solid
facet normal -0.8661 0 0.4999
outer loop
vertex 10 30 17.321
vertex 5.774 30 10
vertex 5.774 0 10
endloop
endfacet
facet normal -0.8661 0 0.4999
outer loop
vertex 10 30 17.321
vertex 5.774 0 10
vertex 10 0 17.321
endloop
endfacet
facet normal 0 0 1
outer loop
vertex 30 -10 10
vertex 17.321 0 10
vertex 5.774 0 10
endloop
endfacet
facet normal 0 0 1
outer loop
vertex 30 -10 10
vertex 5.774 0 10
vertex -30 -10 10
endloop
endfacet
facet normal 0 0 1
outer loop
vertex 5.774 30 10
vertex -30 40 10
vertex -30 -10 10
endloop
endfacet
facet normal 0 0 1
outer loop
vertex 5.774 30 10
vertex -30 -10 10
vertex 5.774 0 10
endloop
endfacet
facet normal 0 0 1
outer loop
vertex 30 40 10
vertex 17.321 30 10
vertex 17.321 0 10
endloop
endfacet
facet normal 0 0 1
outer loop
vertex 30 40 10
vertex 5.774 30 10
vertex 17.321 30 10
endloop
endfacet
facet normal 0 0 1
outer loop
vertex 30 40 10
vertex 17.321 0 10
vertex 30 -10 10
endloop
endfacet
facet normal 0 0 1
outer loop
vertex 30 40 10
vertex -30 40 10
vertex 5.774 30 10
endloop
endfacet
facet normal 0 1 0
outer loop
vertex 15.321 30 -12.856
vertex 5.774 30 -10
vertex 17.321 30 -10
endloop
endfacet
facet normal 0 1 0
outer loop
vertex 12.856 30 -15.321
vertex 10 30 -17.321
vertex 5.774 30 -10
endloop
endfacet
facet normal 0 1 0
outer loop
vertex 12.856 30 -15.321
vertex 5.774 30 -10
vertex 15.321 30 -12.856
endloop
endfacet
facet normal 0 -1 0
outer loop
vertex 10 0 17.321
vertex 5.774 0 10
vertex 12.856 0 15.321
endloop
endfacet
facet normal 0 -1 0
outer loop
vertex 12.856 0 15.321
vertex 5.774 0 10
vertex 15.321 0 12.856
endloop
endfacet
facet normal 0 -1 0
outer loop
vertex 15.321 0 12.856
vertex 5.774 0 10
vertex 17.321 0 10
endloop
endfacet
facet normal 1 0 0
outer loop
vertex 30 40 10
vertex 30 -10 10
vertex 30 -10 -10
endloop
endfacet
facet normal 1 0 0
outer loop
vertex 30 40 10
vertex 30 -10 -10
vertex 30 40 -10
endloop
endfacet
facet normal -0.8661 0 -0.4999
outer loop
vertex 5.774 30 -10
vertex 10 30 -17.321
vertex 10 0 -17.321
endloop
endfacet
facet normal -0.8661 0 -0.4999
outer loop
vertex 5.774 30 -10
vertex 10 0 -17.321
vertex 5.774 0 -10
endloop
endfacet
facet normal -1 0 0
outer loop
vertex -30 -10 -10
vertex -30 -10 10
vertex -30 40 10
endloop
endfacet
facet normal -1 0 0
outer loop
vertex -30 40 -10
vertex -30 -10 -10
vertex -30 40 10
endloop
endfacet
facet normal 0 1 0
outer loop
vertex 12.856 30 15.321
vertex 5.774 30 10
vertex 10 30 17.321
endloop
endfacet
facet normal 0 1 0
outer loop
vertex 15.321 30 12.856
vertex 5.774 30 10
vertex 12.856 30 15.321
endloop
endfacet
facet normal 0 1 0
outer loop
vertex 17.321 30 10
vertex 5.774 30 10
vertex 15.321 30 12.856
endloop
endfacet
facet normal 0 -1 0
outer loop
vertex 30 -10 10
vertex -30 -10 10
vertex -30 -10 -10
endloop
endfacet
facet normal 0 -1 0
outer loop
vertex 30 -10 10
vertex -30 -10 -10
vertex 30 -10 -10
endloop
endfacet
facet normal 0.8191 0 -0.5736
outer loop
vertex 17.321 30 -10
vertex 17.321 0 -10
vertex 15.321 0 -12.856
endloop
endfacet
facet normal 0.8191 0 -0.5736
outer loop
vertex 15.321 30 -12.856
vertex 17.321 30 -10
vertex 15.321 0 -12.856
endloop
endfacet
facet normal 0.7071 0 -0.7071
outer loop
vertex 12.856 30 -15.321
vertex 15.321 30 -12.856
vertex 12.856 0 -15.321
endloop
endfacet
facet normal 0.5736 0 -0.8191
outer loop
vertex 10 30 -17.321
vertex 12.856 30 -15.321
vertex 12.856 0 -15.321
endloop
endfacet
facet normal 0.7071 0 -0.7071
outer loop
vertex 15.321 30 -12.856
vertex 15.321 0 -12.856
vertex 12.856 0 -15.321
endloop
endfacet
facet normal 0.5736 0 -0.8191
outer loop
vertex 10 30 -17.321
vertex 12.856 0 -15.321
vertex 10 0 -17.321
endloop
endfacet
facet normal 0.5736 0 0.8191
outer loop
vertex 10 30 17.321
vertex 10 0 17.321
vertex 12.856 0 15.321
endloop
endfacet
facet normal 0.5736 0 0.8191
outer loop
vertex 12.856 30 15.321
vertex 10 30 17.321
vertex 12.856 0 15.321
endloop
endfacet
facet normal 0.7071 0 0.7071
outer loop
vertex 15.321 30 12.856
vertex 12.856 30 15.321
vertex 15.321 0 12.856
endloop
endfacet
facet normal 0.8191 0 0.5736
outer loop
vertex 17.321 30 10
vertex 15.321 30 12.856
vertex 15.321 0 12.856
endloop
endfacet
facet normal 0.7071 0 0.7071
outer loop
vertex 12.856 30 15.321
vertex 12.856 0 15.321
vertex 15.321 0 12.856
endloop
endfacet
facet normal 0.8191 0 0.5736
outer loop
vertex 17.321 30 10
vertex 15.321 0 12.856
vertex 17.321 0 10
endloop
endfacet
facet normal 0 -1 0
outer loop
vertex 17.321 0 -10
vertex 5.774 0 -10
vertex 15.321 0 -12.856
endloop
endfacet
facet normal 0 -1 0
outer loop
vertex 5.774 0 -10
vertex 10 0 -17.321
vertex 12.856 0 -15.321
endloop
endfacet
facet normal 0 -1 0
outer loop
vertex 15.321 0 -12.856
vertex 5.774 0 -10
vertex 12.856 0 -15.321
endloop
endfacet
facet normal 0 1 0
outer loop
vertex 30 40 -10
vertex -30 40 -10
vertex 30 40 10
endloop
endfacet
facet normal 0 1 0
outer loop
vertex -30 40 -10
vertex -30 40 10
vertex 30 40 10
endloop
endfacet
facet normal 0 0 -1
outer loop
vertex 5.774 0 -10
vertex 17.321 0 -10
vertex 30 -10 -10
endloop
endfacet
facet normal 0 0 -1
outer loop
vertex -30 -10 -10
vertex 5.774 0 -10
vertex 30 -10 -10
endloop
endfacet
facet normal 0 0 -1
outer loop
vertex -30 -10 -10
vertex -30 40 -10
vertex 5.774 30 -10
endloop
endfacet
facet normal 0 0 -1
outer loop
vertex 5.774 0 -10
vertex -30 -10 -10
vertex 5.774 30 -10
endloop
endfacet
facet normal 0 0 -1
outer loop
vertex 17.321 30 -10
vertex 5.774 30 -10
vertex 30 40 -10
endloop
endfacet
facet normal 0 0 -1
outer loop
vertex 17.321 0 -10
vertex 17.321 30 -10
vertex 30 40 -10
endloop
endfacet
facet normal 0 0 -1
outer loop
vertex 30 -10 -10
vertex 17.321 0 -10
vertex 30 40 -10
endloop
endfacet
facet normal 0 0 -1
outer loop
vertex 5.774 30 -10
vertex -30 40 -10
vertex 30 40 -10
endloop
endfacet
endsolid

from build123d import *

# Parameters (mm, degrees)
SKETCH1_W           = 60
SKETCH1_H           = 50
BOSS_EXTRUDE1_DEPTH = 10
REVOLVE1_DEPTH      = 30


# Read off the part's stored shape, not the designer's step: Revolve1
with BuildPart() as part:
    # Sketch1 → Boss-Extrude1 (new, symmetric)
    with BuildSketch(Plane.XY):
        with Locations((0, 15)):
            Rectangle(SKETCH1_W, SKETCH1_H)
    extrude(amount=BOSS_EXTRUDE1_DEPTH, both=True)

    # Revolve1 outline → Revolve1 (add)
    with BuildSketch(Plane(origin=(0, 0, 0), x_dir=(1, 0, 0), z_dir=(0, 1, 0))):
        with BuildLine():
            Line((10, 17.320508076), (5.773502692, 10))
            Line((5.773502692, 10), (17.320508076, 10))
            ThreePointArc((17.320508076, 10), (14.142135624, 14.142135624), (10, 17.320508076))
        make_face()
        with BuildLine():
            ThreePointArc((10, -17.320508076), (14.142135624, -14.142135624), (17.320508076, -10))
            Line((17.320508076, -10), (5.773502692, -10))
            Line((5.773502692, -10), (10, -17.320508076))
        make_face()
    extrude(amount=REVOLVE1_DEPTH)


solid = part.part
